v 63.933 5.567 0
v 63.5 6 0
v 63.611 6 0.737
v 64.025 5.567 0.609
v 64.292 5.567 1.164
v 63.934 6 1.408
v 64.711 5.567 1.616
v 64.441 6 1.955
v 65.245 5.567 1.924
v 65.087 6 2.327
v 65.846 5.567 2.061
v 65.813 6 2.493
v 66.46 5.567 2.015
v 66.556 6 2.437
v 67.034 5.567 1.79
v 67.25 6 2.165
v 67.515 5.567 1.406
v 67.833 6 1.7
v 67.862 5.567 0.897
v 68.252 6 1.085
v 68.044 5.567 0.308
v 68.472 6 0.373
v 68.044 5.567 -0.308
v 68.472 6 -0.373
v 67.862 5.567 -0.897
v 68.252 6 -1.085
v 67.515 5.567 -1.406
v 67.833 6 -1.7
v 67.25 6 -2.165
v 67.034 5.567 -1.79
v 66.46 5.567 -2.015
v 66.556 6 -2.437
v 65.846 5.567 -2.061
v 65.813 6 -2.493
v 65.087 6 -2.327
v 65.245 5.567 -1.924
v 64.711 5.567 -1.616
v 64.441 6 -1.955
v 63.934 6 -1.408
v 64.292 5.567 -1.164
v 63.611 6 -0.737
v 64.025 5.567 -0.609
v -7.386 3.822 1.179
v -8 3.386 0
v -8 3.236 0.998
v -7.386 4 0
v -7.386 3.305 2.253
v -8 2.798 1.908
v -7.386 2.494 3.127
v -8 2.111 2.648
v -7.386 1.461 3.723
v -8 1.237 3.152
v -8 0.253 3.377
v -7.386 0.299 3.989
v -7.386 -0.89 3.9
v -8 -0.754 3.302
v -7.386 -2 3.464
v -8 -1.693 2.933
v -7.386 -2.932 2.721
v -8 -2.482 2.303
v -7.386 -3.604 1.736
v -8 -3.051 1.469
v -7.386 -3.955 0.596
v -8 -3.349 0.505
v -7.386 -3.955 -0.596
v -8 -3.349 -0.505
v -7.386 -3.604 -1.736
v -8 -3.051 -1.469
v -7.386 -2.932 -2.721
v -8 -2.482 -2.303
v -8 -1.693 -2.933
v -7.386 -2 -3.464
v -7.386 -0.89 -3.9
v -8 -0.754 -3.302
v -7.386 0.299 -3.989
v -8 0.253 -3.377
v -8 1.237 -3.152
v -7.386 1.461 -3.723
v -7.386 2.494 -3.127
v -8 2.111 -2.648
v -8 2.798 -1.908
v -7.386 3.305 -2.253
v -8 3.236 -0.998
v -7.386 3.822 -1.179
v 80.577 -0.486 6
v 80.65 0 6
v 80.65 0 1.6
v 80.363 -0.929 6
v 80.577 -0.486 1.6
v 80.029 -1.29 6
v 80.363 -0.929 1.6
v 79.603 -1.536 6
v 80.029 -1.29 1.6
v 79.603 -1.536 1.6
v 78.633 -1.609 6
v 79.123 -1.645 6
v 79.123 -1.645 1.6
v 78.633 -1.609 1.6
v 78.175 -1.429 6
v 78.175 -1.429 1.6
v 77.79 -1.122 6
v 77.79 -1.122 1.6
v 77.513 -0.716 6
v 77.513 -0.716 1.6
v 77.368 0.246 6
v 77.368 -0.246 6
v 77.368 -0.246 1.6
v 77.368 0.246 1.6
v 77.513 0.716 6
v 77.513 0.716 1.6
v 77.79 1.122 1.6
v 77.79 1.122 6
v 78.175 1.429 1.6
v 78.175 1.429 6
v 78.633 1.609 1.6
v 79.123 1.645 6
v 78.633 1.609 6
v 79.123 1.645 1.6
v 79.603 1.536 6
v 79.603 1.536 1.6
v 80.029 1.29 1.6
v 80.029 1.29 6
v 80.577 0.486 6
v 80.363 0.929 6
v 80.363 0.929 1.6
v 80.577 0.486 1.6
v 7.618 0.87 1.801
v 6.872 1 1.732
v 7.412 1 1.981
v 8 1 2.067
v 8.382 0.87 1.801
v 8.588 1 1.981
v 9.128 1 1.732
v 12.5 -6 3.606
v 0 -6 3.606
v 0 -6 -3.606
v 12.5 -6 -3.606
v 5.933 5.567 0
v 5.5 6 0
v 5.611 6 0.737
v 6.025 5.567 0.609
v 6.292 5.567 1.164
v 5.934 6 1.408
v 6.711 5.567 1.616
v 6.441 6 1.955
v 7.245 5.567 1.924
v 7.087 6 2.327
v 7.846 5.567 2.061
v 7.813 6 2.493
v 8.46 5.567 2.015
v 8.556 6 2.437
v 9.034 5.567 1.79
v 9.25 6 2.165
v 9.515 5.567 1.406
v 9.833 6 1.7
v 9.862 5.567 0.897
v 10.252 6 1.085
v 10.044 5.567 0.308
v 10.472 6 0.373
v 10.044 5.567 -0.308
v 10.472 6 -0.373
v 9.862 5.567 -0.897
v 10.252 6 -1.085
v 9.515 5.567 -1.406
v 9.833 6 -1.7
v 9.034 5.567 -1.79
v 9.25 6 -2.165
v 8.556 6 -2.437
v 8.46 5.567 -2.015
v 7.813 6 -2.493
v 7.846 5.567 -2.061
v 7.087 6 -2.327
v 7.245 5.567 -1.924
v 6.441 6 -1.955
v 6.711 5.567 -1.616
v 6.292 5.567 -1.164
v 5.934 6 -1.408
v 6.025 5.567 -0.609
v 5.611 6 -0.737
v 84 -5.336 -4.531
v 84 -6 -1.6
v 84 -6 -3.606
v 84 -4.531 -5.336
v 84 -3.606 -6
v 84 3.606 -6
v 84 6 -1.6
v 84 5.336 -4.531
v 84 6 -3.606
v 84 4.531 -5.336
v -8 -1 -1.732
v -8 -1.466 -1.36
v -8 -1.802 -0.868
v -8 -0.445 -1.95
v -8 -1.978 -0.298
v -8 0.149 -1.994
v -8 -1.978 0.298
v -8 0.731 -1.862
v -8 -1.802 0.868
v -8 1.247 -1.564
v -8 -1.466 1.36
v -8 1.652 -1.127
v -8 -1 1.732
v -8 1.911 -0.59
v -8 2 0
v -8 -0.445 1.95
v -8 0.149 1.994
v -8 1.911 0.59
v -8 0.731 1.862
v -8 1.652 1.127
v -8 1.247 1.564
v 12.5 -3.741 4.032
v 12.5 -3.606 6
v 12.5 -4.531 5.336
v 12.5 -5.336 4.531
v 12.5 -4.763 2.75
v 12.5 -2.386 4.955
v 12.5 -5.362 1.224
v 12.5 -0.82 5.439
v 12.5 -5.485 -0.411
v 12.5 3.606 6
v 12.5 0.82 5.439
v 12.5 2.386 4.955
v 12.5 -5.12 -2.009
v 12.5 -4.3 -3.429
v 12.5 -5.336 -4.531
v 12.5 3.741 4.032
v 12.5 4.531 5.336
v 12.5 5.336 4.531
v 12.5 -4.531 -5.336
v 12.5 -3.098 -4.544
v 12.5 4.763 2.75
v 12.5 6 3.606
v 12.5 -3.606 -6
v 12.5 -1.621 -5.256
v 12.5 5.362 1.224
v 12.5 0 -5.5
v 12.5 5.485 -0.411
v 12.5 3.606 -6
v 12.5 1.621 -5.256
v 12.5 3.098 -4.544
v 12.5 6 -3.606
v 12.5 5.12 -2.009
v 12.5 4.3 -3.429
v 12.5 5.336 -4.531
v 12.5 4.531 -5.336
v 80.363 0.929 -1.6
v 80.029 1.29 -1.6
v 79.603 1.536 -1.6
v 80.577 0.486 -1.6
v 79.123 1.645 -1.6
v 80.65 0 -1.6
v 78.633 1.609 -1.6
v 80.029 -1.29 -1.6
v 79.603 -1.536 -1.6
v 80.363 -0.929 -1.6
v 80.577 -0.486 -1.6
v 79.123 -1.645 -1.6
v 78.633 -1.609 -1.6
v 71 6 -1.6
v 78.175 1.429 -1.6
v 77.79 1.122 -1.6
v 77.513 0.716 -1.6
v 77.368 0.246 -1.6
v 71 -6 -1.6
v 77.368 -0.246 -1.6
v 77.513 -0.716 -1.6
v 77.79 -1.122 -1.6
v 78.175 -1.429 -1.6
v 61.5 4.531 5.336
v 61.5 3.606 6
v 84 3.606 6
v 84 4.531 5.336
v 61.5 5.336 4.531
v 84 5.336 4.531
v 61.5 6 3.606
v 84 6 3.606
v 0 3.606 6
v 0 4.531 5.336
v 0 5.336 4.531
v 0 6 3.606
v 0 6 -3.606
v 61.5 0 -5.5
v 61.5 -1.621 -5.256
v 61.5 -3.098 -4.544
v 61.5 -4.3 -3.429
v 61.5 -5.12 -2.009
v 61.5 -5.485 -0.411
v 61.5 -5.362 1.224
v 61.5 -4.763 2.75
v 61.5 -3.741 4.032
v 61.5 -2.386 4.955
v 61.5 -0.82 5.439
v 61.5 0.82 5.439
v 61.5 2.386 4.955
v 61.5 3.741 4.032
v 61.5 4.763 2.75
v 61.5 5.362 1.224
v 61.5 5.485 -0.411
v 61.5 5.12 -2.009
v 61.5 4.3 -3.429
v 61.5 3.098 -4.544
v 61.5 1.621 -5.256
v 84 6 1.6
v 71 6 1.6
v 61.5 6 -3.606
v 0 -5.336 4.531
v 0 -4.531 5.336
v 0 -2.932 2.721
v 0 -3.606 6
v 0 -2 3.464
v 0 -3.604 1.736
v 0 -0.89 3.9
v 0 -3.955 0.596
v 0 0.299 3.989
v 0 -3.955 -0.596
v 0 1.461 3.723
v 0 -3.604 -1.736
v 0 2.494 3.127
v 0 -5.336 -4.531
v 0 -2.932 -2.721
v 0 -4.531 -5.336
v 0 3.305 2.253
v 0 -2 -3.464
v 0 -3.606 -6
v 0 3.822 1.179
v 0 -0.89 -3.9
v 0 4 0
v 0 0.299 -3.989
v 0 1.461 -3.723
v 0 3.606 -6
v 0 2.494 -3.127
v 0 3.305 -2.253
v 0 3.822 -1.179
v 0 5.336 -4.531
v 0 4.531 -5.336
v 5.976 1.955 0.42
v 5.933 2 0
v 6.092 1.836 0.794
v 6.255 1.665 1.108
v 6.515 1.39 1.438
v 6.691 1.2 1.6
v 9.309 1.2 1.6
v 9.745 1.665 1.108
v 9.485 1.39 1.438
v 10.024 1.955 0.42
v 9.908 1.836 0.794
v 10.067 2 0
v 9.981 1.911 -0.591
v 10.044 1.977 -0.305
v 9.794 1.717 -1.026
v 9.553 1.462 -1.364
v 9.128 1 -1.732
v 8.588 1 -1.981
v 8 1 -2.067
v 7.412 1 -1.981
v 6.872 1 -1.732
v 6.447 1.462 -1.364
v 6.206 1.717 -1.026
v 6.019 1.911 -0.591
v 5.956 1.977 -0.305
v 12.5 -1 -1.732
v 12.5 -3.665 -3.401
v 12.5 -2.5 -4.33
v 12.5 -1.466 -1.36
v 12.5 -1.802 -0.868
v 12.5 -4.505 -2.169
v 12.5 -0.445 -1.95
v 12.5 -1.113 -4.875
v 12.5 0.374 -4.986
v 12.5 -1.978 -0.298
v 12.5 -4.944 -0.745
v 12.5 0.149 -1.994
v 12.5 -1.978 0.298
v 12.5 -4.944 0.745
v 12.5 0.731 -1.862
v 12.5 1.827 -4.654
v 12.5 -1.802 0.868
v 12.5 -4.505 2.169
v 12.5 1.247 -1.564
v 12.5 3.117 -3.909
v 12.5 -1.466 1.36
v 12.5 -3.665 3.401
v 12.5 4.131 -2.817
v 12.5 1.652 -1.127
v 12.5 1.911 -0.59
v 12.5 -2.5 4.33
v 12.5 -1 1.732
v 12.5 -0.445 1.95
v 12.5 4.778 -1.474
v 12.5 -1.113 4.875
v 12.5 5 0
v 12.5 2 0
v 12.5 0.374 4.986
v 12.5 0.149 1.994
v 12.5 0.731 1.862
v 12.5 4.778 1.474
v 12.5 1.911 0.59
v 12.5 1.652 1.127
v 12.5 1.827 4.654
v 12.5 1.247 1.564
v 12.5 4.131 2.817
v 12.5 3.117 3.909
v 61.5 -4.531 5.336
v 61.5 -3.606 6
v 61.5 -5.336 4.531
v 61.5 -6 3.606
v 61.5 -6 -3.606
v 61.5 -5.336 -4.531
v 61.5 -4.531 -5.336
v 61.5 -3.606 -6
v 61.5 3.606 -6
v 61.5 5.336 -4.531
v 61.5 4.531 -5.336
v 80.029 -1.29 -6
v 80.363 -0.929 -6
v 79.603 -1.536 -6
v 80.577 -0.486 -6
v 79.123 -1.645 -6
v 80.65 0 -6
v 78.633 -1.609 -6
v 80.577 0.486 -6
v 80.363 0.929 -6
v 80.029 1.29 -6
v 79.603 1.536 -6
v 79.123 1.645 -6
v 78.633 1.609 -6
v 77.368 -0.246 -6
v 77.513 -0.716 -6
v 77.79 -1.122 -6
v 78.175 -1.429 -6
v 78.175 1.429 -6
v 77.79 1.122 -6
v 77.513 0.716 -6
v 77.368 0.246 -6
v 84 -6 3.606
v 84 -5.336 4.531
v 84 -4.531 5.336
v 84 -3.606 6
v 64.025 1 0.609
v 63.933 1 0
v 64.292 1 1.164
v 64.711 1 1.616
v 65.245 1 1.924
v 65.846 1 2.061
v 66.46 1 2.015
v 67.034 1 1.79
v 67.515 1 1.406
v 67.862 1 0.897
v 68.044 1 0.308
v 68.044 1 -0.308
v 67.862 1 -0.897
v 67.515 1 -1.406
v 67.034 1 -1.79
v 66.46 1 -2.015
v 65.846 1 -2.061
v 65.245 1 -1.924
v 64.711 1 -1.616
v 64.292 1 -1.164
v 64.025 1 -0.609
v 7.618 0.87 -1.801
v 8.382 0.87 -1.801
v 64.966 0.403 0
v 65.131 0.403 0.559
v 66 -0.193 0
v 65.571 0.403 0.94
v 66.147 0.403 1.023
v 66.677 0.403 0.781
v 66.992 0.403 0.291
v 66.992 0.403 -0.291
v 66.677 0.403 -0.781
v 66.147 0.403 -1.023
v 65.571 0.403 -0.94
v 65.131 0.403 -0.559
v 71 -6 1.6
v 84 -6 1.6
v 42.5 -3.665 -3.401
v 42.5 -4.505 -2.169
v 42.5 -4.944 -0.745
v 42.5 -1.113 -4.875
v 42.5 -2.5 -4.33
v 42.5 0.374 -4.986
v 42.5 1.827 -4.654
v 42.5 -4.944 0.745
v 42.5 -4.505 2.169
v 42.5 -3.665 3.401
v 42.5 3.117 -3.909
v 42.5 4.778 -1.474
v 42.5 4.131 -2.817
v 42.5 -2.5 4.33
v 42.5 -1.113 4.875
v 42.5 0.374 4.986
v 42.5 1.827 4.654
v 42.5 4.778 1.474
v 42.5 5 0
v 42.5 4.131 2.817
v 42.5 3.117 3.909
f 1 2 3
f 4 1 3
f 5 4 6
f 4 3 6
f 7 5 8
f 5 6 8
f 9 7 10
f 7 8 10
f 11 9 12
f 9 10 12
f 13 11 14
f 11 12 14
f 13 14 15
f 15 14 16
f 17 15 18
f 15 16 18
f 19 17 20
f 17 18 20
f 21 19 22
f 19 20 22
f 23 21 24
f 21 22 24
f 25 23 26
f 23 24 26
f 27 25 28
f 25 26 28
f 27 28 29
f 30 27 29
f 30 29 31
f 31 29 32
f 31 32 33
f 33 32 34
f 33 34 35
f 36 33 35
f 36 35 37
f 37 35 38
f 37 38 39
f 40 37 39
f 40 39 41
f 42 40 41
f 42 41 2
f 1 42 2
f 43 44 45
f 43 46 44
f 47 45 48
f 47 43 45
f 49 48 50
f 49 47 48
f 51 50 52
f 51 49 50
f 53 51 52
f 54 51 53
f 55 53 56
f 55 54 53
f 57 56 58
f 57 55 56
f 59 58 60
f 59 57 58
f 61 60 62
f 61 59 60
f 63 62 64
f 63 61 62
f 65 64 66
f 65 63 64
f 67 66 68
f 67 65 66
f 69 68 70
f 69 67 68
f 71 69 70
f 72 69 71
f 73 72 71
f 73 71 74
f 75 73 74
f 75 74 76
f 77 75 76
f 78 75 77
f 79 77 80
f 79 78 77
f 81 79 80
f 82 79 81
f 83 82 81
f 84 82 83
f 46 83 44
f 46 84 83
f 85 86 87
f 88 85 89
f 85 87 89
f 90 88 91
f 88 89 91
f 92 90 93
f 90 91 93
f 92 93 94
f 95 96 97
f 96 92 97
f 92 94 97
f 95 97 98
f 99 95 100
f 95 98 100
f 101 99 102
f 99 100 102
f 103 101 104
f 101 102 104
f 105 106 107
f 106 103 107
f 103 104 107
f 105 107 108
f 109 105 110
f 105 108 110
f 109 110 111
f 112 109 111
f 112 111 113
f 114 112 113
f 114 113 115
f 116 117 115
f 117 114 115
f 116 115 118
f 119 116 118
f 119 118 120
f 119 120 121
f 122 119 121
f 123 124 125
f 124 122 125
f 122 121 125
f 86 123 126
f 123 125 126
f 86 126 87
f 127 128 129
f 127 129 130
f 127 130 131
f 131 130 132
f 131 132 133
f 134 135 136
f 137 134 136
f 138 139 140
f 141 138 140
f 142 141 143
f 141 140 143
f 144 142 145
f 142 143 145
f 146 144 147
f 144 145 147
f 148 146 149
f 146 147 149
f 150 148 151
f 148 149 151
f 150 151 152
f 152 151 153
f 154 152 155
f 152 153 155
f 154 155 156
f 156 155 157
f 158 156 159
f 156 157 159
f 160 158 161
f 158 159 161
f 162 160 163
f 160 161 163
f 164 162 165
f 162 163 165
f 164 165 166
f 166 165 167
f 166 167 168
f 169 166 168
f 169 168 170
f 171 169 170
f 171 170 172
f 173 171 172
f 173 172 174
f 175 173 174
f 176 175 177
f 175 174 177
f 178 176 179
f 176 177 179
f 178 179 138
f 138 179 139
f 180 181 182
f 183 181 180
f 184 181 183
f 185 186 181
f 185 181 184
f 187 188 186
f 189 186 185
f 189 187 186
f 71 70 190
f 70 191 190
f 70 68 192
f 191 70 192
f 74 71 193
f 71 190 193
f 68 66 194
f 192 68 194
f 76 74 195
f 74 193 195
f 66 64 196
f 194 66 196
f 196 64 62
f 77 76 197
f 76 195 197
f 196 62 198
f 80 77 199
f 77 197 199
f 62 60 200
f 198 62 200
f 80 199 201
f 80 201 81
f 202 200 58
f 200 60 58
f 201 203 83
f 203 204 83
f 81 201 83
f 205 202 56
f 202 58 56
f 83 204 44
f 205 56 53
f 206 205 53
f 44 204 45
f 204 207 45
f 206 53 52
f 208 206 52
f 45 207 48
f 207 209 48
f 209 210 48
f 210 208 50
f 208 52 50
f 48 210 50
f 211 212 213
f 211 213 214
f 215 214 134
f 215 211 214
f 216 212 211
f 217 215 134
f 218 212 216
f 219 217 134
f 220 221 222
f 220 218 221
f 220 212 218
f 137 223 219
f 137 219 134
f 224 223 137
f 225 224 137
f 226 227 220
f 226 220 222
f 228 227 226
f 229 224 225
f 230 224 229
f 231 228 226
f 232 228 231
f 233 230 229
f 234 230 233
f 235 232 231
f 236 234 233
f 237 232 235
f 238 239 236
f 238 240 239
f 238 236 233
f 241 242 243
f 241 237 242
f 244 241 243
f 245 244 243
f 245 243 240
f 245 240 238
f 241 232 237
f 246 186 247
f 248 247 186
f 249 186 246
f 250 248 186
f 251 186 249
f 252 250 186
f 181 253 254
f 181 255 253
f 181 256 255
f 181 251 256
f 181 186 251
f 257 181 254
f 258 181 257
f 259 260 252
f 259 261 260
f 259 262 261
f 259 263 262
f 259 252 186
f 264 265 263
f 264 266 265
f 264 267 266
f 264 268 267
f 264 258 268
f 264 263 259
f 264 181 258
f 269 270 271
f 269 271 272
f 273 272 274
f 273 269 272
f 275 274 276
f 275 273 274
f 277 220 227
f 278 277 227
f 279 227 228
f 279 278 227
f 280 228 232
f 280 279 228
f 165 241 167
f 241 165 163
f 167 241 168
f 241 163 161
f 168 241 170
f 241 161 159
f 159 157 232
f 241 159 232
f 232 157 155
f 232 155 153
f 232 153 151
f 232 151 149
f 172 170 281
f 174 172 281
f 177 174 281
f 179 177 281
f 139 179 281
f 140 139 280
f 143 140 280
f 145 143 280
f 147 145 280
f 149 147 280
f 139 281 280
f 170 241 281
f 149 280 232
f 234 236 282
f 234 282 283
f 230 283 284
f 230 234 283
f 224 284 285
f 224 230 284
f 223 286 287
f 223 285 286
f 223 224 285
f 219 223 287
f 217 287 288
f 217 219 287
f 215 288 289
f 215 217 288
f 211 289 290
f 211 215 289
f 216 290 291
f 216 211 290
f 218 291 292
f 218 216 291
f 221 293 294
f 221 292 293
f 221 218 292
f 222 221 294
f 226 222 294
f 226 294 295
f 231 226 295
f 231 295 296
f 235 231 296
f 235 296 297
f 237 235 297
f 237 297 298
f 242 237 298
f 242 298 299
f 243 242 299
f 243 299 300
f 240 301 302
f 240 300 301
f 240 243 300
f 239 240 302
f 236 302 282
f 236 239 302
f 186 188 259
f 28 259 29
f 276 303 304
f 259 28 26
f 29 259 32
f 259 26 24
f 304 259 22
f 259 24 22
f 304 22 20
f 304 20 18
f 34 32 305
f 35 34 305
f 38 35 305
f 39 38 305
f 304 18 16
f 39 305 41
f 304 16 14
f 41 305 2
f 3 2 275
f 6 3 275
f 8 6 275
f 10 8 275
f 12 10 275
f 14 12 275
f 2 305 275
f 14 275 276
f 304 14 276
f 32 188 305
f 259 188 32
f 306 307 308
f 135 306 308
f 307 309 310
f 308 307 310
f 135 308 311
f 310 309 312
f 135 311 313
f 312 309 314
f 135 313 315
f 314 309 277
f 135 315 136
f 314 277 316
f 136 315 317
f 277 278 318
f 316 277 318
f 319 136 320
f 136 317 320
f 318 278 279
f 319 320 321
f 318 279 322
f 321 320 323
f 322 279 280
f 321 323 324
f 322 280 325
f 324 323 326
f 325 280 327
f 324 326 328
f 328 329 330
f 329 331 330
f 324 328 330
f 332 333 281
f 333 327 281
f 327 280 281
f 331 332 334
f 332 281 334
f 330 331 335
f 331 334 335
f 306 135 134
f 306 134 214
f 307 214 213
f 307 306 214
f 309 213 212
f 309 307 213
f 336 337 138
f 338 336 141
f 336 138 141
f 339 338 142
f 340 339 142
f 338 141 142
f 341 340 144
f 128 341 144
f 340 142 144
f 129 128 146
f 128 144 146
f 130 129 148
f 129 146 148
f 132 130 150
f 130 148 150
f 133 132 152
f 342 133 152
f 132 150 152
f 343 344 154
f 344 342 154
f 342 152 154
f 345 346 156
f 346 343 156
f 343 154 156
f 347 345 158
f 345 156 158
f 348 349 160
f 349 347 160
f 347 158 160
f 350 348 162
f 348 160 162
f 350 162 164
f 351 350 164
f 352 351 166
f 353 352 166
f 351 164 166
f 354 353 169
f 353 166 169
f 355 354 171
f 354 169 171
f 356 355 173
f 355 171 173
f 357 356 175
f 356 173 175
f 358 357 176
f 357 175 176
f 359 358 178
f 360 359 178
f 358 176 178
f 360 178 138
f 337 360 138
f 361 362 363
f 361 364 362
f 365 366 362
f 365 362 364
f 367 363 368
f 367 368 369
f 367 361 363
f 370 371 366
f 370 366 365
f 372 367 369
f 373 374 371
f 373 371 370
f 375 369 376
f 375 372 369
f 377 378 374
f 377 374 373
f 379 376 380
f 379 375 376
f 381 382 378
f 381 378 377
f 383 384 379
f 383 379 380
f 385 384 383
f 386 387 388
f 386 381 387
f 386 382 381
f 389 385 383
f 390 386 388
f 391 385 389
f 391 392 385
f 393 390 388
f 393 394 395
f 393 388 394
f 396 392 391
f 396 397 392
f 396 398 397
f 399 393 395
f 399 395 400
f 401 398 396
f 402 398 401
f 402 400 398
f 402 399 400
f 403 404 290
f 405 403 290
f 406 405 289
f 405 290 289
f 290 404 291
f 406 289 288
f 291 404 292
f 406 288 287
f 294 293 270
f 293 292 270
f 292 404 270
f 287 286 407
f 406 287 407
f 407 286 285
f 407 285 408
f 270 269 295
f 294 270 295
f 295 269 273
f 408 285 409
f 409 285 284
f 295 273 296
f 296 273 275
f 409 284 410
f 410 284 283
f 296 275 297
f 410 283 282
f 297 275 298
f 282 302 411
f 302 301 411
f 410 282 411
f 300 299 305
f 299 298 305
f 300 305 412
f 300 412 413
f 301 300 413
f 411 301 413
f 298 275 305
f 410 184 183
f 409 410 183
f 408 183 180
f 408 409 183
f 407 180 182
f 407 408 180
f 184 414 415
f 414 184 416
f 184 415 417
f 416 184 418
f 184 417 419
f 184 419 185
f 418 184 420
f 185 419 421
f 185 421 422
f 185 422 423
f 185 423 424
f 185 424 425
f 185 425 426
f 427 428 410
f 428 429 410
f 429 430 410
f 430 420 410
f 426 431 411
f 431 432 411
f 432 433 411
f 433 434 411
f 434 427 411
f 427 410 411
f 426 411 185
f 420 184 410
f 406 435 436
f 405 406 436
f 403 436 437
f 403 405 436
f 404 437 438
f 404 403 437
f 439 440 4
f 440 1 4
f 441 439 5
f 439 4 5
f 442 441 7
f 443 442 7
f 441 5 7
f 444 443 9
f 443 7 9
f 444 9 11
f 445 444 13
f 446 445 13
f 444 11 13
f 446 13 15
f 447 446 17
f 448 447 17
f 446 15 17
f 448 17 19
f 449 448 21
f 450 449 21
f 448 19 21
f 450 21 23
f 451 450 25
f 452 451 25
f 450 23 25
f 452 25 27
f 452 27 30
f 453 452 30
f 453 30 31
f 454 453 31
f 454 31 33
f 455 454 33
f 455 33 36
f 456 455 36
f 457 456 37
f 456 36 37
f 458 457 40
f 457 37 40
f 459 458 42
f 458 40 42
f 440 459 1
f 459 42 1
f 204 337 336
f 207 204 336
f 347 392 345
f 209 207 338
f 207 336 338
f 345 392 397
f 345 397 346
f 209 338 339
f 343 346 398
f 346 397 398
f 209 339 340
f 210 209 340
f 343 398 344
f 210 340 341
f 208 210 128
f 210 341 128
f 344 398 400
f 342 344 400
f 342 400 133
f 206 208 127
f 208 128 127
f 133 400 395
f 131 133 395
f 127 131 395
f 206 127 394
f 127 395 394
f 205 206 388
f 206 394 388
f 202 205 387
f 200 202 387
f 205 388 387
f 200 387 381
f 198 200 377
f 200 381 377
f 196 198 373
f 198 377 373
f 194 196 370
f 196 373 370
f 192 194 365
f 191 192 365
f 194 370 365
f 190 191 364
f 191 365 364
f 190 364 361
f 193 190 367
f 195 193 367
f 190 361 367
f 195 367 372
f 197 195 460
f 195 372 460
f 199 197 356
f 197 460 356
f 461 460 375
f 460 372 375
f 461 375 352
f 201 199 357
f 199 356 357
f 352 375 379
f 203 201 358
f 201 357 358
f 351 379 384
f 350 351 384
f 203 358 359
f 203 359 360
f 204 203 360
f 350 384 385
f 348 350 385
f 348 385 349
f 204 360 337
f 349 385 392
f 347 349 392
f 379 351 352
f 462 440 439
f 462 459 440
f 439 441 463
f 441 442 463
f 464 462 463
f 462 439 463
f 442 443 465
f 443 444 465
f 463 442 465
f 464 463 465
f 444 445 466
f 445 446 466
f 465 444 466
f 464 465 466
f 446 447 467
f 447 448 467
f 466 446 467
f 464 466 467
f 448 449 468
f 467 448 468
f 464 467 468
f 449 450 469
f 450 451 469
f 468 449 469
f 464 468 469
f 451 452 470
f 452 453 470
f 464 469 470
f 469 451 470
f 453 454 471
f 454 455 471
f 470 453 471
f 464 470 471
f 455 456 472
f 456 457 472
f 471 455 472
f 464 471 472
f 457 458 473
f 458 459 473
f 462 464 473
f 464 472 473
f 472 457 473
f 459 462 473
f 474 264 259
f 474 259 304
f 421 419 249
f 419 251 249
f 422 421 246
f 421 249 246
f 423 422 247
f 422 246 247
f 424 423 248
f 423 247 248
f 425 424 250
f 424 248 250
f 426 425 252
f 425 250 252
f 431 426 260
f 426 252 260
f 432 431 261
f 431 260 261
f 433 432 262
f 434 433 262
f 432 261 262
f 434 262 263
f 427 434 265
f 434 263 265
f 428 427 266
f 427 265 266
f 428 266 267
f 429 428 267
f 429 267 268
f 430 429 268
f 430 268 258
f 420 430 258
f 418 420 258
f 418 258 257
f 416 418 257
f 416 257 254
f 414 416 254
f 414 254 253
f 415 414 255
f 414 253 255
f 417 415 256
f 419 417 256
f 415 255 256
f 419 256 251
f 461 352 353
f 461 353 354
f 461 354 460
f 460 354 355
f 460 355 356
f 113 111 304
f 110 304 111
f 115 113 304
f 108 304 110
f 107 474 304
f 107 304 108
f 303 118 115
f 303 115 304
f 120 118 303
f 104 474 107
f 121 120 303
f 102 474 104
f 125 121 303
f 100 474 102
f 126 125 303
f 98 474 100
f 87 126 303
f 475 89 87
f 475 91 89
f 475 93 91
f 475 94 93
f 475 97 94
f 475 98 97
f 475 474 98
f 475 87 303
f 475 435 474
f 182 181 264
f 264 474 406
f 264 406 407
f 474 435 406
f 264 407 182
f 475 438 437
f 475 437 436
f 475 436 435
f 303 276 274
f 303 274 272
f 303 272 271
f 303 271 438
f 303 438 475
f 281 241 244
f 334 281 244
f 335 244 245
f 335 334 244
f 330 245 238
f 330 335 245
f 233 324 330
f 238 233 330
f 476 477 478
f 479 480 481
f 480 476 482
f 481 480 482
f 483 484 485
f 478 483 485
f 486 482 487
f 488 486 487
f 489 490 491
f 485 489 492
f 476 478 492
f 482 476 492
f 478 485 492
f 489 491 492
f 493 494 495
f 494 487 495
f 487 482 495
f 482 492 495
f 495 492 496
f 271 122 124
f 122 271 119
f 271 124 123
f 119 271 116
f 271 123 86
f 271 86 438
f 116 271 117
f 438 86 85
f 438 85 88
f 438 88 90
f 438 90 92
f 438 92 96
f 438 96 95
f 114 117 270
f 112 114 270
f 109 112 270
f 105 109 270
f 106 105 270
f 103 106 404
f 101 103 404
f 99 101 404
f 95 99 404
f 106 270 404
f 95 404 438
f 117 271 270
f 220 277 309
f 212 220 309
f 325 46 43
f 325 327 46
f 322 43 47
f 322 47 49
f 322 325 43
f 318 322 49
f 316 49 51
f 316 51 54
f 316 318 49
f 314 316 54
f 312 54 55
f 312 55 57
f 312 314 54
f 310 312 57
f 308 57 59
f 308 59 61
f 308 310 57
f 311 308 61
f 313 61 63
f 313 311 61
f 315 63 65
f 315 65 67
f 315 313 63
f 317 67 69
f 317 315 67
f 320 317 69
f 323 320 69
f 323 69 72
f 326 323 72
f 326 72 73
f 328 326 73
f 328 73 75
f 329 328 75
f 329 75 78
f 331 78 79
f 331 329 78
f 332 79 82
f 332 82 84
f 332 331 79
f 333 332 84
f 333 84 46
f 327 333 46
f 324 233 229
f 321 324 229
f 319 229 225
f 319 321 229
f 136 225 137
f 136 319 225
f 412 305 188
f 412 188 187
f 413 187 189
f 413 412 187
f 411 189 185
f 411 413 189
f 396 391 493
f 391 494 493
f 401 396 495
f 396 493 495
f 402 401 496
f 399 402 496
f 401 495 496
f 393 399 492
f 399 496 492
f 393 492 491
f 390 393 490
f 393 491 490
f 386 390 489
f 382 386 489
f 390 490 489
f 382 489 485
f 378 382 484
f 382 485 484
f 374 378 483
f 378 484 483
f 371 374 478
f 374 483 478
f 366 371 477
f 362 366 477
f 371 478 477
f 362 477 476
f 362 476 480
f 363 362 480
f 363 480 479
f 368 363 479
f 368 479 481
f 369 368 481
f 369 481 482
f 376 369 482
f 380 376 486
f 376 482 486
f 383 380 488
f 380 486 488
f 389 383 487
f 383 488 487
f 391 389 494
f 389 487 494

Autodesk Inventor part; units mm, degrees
sketch "Sketch_8" plane through (0, 0, 0) normal (0, 0, 1) x (1, 0, 0)
  line L0 (0, 0) -> (-8, 0)
  line L1 (-8, 0) -> (-8, 3.3865)
  line L2 (-8, 3.3865) -> (-7.3865, 4)
  line L3 (-7.3865, 4) -> (0, 4)
  line L4 (0, 4) -> (0, 0)
  line L5 (0, 0) -> (-8, 0)
revolve "Revolution1" add sketch "Sketch_8" angle 360 about axis through (0, 0, 0) along (1, 0, 0)
thread "Thread1" size "M8x1" class "6g" standard "ISO Metric profile" length 5.8865
sketch "Sketch_9" plane through (0, 0, 0) normal (1, 0, 0) x (0, 0, -1)
  line L0 (-6, 3.6056) -> (-6, -3.6056)
  arc A0 (-6, -3.6056) -> (-3.6056, -6) centre (0, 0) ccw
  line L1 (-3.6056, -6) -> (3.6056, -6)
  arc A1 (3.6056, -6) -> (6, -3.6056) centre (0, 0) ccw
  line L2 (6, -3.6056) -> (6, 3.6056)
  arc A2 (6, 3.6056) -> (3.6056, 6) centre (0, 0) ccw
  line L3 (3.6056, 6) -> (-3.6056, 6)
  arc A3 (-3.6056, 6) -> (-6, 3.6056) centre (0, 0) ccw
extrude "Extrusion1" add sketch "Sketch_9" along normal blind 12.5
sketch "Sketch_6" plane through (12.5, 0, 0) normal (1, 0, 0) x (0, 0, -1)
  circle A0 centre (0, 0) radius 5.5
extrude "Extrusion2" add sketch "Sketch_6" along normal blind 49
sketch "Sketch_10" plane through (61.5, 0, 0) normal (1, 0, 0) x (0, 0, -1)
  line L0 (-6, 3.6056) -> (-6, -3.6056)
  arc A0 (-6, -3.6056) -> (-3.6056, -6) centre (0, 0) ccw
  line L1 (-3.6056, -6) -> (3.6056, -6)
  arc A1 (3.6056, -6) -> (6, -3.6056) centre (0, 0) ccw
  line L2 (6, -3.6056) -> (6, 3.6056)
  arc A2 (6, 3.6056) -> (3.6056, 6) centre (0, 0) ccw
  line L3 (3.6056, 6) -> (-3.6056, 6)
  arc A3 (-3.6056, 6) -> (-6, 3.6056) centre (0, 0) ccw
extrude "Extrusion3" add sketch "Sketch_10" along normal blind 22.5
sketch "Sketch7" plane through (0, 0, 0) normal (0, 0, 1) x (1, 0, 0)
  line L0 (8, 6) -> (8, 1)
  line L1 (8, -0.1934) -> (5.933, 1)
  line L2 (5.933, 1) -> (5.933, 5.567)
  line L3 (5.933, 5.567) -> (5.5, 6)
  line L4 (5.5, 6) -> (8, 6)
  line L5 (8, 6) -> (8, -0.1934)
revolve "Revolution2" cut sketch "Sketch7" angle 360 about axis through (8, 6, 0) along (0, 1, 0)
thread "Thread2" size "M5x0.8" class "6H" standard "ISO Metric profile" full length
sketch "Sketch_7" plane through (0, 0, 0) normal (0, 0, 1) x (1, 0, 0)
  line L0 (66, 6) -> (66, 1)
  line L1 (66, -0.1934) -> (63.933, 1)
  line L2 (63.933, 1) -> (63.933, 5.567)
  line L3 (63.933, 5.567) -> (63.5, 6)
  line L4 (63.5, 6) -> (66, 6)
  line L5 (66, 6) -> (66, -0.1934)
revolve "Revolution3" cut sketch "Sketch_7" angle 360 about axis through (66, 6, 0) along (0, 1, 0)
thread "Thread3" size "M5x0.8" class "6H" standard "ISO Metric profile" full length
sketch "Sketch_16" plane through (0, 0, 0) normal (0, 0, 1) x (1, 0, 0)
  line L0 (42.5, 0) -> (-8, 0)
  line L1 (-8, 0) -> (-8, 2)
  line L2 (-8, 2) -> (12.5, 2)
  line L3 (12.5, 2) -> (12.5, 5)
  line L4 (12.5, 5) -> (42.5, 5)
  line L5 (42.5, 5) -> (42.5, 0)
  line L6 (42.5, 0) -> (-8, 0)
revolve "Revolution4" cut sketch "Sketch_16" angle 360 about axis through (42.5, 0, 0) along (1, 0, 0)
sketch "Sketch_3" plane through (0, 0, 0) normal (0, 1, 0) x (-1, 0, 0)
  line L0 (-71, 1.6) -> (-84, 1.6)
  line L1 (-84, 1.6) -> (-84, -1.6)
  line L2 (-84, -1.6) -> (-71, -1.6)
  line L3 (-71, -1.6) -> (-71, 1.6)
extrude "Extrusion4" cut sketch "Sketch_3" along normal mid plane 12
sketch "Sketch_13" plane through (0, 0, 0) normal (0, 0, 1) x (1, 0, 0)
  circle A0 centre (79, 0) radius 1.65
extrude "Extrusion5" cut sketch "Sketch_13" along normal mid plane 12
ref_plane "BODY_N_XY" through (79, 0, 0) normal (0, 0, -1) x (1, 0, 0)
ref_plane "BODY_N_YZ" through (79, 0, 0) normal (1, 0, 0) x (0, -1, 0)
ref_plane "BODY_N_ZX" through (79, 0, 0) normal (0, -1, 0) x (0, 0, -1)
ref_plane "BODY_PIN_XY" through (79, 0, 0) normal (-1, 0, 0) x (0, 0, -1)
ref_plane "BODY_PIN_YZ" through (79, 0, 0) normal (0, 0, -1) x (0, -1, 0)
ref_plane "BODY_PIN_ZX" through (79, 0, 0) normal (0, -1, 0) x (-1, 0, 0)
ref_plane "NUT2_XY" through (71, 0, 0) normal (1, 0, 0) x (0, 0, -1)
ref_plane "NUT2_YZ" through (71, 0, 0) normal (0, 0, -1) x (0, 1, 0)
ref_plane "NUT2_ZX" through (71, 0, 0) normal (0, 1, 0) x (1, 0, 0)
ref_plane "SW1_XY" through (17, 0, 0) normal (1, 0, 0) x (0, 0, -1)
ref_plane "SW1_YZ" through (17, 0, 0) normal (0, 0, -1) x (0, 1, 0)
ref_plane "SW1_ZX" through (17, 0, 0) normal (0, 1, 0) x (1, 0, 0)
ref_plane "SW2_XY" through (57, 0, 0) normal (-1, 0, 0) x (0, 0, -1)
ref_plane "SW2_YZ" through (57, 0, 0) normal (0, 0, -1) x (0, -1, 0)
ref_plane "SW2_ZX" through (57, 0, 0) normal (0, -1, 0) x (-1, 0, 0)
ref_plane "SW_R1_XY" through (17, -11, 0) normal (1, 0, 0) x (0, 0, -1)
ref_plane "SW_R1_YZ" through (17, -11, 0) normal (0, 0, -1) x (0, 1, 0)
ref_plane "SW_R1_ZX" through (17, -11, 0) normal (0, 1, 0) x (1, 0, 0)
ref_plane "SW_R2_XY" through (57, -11, 0) normal (-1, 0, 0) x (0, 0, -1)
ref_plane "SW_R2_YZ" through (57, -11, 0) normal (0, 0, -1) x (0, -1, 0)
ref_plane "SW_R2_ZX" through (57, -11, 0) normal (0, -1, 0) x (-1, 0, 0)
ref_plane "body_XY" through (0, 0, 0) normal (-1, 0, 0) x (0, 0, -1)
ref_plane "body_YZ" through (0, 0, 0) normal (0, 0, -1) x (0, -1, 0)
ref_plane "body_ZX" through (0, 0, 0) normal (0, -1, 0) x (-1, 0, 0)
properties part number "CJ2D10-25Z(1_0)_BODY"
